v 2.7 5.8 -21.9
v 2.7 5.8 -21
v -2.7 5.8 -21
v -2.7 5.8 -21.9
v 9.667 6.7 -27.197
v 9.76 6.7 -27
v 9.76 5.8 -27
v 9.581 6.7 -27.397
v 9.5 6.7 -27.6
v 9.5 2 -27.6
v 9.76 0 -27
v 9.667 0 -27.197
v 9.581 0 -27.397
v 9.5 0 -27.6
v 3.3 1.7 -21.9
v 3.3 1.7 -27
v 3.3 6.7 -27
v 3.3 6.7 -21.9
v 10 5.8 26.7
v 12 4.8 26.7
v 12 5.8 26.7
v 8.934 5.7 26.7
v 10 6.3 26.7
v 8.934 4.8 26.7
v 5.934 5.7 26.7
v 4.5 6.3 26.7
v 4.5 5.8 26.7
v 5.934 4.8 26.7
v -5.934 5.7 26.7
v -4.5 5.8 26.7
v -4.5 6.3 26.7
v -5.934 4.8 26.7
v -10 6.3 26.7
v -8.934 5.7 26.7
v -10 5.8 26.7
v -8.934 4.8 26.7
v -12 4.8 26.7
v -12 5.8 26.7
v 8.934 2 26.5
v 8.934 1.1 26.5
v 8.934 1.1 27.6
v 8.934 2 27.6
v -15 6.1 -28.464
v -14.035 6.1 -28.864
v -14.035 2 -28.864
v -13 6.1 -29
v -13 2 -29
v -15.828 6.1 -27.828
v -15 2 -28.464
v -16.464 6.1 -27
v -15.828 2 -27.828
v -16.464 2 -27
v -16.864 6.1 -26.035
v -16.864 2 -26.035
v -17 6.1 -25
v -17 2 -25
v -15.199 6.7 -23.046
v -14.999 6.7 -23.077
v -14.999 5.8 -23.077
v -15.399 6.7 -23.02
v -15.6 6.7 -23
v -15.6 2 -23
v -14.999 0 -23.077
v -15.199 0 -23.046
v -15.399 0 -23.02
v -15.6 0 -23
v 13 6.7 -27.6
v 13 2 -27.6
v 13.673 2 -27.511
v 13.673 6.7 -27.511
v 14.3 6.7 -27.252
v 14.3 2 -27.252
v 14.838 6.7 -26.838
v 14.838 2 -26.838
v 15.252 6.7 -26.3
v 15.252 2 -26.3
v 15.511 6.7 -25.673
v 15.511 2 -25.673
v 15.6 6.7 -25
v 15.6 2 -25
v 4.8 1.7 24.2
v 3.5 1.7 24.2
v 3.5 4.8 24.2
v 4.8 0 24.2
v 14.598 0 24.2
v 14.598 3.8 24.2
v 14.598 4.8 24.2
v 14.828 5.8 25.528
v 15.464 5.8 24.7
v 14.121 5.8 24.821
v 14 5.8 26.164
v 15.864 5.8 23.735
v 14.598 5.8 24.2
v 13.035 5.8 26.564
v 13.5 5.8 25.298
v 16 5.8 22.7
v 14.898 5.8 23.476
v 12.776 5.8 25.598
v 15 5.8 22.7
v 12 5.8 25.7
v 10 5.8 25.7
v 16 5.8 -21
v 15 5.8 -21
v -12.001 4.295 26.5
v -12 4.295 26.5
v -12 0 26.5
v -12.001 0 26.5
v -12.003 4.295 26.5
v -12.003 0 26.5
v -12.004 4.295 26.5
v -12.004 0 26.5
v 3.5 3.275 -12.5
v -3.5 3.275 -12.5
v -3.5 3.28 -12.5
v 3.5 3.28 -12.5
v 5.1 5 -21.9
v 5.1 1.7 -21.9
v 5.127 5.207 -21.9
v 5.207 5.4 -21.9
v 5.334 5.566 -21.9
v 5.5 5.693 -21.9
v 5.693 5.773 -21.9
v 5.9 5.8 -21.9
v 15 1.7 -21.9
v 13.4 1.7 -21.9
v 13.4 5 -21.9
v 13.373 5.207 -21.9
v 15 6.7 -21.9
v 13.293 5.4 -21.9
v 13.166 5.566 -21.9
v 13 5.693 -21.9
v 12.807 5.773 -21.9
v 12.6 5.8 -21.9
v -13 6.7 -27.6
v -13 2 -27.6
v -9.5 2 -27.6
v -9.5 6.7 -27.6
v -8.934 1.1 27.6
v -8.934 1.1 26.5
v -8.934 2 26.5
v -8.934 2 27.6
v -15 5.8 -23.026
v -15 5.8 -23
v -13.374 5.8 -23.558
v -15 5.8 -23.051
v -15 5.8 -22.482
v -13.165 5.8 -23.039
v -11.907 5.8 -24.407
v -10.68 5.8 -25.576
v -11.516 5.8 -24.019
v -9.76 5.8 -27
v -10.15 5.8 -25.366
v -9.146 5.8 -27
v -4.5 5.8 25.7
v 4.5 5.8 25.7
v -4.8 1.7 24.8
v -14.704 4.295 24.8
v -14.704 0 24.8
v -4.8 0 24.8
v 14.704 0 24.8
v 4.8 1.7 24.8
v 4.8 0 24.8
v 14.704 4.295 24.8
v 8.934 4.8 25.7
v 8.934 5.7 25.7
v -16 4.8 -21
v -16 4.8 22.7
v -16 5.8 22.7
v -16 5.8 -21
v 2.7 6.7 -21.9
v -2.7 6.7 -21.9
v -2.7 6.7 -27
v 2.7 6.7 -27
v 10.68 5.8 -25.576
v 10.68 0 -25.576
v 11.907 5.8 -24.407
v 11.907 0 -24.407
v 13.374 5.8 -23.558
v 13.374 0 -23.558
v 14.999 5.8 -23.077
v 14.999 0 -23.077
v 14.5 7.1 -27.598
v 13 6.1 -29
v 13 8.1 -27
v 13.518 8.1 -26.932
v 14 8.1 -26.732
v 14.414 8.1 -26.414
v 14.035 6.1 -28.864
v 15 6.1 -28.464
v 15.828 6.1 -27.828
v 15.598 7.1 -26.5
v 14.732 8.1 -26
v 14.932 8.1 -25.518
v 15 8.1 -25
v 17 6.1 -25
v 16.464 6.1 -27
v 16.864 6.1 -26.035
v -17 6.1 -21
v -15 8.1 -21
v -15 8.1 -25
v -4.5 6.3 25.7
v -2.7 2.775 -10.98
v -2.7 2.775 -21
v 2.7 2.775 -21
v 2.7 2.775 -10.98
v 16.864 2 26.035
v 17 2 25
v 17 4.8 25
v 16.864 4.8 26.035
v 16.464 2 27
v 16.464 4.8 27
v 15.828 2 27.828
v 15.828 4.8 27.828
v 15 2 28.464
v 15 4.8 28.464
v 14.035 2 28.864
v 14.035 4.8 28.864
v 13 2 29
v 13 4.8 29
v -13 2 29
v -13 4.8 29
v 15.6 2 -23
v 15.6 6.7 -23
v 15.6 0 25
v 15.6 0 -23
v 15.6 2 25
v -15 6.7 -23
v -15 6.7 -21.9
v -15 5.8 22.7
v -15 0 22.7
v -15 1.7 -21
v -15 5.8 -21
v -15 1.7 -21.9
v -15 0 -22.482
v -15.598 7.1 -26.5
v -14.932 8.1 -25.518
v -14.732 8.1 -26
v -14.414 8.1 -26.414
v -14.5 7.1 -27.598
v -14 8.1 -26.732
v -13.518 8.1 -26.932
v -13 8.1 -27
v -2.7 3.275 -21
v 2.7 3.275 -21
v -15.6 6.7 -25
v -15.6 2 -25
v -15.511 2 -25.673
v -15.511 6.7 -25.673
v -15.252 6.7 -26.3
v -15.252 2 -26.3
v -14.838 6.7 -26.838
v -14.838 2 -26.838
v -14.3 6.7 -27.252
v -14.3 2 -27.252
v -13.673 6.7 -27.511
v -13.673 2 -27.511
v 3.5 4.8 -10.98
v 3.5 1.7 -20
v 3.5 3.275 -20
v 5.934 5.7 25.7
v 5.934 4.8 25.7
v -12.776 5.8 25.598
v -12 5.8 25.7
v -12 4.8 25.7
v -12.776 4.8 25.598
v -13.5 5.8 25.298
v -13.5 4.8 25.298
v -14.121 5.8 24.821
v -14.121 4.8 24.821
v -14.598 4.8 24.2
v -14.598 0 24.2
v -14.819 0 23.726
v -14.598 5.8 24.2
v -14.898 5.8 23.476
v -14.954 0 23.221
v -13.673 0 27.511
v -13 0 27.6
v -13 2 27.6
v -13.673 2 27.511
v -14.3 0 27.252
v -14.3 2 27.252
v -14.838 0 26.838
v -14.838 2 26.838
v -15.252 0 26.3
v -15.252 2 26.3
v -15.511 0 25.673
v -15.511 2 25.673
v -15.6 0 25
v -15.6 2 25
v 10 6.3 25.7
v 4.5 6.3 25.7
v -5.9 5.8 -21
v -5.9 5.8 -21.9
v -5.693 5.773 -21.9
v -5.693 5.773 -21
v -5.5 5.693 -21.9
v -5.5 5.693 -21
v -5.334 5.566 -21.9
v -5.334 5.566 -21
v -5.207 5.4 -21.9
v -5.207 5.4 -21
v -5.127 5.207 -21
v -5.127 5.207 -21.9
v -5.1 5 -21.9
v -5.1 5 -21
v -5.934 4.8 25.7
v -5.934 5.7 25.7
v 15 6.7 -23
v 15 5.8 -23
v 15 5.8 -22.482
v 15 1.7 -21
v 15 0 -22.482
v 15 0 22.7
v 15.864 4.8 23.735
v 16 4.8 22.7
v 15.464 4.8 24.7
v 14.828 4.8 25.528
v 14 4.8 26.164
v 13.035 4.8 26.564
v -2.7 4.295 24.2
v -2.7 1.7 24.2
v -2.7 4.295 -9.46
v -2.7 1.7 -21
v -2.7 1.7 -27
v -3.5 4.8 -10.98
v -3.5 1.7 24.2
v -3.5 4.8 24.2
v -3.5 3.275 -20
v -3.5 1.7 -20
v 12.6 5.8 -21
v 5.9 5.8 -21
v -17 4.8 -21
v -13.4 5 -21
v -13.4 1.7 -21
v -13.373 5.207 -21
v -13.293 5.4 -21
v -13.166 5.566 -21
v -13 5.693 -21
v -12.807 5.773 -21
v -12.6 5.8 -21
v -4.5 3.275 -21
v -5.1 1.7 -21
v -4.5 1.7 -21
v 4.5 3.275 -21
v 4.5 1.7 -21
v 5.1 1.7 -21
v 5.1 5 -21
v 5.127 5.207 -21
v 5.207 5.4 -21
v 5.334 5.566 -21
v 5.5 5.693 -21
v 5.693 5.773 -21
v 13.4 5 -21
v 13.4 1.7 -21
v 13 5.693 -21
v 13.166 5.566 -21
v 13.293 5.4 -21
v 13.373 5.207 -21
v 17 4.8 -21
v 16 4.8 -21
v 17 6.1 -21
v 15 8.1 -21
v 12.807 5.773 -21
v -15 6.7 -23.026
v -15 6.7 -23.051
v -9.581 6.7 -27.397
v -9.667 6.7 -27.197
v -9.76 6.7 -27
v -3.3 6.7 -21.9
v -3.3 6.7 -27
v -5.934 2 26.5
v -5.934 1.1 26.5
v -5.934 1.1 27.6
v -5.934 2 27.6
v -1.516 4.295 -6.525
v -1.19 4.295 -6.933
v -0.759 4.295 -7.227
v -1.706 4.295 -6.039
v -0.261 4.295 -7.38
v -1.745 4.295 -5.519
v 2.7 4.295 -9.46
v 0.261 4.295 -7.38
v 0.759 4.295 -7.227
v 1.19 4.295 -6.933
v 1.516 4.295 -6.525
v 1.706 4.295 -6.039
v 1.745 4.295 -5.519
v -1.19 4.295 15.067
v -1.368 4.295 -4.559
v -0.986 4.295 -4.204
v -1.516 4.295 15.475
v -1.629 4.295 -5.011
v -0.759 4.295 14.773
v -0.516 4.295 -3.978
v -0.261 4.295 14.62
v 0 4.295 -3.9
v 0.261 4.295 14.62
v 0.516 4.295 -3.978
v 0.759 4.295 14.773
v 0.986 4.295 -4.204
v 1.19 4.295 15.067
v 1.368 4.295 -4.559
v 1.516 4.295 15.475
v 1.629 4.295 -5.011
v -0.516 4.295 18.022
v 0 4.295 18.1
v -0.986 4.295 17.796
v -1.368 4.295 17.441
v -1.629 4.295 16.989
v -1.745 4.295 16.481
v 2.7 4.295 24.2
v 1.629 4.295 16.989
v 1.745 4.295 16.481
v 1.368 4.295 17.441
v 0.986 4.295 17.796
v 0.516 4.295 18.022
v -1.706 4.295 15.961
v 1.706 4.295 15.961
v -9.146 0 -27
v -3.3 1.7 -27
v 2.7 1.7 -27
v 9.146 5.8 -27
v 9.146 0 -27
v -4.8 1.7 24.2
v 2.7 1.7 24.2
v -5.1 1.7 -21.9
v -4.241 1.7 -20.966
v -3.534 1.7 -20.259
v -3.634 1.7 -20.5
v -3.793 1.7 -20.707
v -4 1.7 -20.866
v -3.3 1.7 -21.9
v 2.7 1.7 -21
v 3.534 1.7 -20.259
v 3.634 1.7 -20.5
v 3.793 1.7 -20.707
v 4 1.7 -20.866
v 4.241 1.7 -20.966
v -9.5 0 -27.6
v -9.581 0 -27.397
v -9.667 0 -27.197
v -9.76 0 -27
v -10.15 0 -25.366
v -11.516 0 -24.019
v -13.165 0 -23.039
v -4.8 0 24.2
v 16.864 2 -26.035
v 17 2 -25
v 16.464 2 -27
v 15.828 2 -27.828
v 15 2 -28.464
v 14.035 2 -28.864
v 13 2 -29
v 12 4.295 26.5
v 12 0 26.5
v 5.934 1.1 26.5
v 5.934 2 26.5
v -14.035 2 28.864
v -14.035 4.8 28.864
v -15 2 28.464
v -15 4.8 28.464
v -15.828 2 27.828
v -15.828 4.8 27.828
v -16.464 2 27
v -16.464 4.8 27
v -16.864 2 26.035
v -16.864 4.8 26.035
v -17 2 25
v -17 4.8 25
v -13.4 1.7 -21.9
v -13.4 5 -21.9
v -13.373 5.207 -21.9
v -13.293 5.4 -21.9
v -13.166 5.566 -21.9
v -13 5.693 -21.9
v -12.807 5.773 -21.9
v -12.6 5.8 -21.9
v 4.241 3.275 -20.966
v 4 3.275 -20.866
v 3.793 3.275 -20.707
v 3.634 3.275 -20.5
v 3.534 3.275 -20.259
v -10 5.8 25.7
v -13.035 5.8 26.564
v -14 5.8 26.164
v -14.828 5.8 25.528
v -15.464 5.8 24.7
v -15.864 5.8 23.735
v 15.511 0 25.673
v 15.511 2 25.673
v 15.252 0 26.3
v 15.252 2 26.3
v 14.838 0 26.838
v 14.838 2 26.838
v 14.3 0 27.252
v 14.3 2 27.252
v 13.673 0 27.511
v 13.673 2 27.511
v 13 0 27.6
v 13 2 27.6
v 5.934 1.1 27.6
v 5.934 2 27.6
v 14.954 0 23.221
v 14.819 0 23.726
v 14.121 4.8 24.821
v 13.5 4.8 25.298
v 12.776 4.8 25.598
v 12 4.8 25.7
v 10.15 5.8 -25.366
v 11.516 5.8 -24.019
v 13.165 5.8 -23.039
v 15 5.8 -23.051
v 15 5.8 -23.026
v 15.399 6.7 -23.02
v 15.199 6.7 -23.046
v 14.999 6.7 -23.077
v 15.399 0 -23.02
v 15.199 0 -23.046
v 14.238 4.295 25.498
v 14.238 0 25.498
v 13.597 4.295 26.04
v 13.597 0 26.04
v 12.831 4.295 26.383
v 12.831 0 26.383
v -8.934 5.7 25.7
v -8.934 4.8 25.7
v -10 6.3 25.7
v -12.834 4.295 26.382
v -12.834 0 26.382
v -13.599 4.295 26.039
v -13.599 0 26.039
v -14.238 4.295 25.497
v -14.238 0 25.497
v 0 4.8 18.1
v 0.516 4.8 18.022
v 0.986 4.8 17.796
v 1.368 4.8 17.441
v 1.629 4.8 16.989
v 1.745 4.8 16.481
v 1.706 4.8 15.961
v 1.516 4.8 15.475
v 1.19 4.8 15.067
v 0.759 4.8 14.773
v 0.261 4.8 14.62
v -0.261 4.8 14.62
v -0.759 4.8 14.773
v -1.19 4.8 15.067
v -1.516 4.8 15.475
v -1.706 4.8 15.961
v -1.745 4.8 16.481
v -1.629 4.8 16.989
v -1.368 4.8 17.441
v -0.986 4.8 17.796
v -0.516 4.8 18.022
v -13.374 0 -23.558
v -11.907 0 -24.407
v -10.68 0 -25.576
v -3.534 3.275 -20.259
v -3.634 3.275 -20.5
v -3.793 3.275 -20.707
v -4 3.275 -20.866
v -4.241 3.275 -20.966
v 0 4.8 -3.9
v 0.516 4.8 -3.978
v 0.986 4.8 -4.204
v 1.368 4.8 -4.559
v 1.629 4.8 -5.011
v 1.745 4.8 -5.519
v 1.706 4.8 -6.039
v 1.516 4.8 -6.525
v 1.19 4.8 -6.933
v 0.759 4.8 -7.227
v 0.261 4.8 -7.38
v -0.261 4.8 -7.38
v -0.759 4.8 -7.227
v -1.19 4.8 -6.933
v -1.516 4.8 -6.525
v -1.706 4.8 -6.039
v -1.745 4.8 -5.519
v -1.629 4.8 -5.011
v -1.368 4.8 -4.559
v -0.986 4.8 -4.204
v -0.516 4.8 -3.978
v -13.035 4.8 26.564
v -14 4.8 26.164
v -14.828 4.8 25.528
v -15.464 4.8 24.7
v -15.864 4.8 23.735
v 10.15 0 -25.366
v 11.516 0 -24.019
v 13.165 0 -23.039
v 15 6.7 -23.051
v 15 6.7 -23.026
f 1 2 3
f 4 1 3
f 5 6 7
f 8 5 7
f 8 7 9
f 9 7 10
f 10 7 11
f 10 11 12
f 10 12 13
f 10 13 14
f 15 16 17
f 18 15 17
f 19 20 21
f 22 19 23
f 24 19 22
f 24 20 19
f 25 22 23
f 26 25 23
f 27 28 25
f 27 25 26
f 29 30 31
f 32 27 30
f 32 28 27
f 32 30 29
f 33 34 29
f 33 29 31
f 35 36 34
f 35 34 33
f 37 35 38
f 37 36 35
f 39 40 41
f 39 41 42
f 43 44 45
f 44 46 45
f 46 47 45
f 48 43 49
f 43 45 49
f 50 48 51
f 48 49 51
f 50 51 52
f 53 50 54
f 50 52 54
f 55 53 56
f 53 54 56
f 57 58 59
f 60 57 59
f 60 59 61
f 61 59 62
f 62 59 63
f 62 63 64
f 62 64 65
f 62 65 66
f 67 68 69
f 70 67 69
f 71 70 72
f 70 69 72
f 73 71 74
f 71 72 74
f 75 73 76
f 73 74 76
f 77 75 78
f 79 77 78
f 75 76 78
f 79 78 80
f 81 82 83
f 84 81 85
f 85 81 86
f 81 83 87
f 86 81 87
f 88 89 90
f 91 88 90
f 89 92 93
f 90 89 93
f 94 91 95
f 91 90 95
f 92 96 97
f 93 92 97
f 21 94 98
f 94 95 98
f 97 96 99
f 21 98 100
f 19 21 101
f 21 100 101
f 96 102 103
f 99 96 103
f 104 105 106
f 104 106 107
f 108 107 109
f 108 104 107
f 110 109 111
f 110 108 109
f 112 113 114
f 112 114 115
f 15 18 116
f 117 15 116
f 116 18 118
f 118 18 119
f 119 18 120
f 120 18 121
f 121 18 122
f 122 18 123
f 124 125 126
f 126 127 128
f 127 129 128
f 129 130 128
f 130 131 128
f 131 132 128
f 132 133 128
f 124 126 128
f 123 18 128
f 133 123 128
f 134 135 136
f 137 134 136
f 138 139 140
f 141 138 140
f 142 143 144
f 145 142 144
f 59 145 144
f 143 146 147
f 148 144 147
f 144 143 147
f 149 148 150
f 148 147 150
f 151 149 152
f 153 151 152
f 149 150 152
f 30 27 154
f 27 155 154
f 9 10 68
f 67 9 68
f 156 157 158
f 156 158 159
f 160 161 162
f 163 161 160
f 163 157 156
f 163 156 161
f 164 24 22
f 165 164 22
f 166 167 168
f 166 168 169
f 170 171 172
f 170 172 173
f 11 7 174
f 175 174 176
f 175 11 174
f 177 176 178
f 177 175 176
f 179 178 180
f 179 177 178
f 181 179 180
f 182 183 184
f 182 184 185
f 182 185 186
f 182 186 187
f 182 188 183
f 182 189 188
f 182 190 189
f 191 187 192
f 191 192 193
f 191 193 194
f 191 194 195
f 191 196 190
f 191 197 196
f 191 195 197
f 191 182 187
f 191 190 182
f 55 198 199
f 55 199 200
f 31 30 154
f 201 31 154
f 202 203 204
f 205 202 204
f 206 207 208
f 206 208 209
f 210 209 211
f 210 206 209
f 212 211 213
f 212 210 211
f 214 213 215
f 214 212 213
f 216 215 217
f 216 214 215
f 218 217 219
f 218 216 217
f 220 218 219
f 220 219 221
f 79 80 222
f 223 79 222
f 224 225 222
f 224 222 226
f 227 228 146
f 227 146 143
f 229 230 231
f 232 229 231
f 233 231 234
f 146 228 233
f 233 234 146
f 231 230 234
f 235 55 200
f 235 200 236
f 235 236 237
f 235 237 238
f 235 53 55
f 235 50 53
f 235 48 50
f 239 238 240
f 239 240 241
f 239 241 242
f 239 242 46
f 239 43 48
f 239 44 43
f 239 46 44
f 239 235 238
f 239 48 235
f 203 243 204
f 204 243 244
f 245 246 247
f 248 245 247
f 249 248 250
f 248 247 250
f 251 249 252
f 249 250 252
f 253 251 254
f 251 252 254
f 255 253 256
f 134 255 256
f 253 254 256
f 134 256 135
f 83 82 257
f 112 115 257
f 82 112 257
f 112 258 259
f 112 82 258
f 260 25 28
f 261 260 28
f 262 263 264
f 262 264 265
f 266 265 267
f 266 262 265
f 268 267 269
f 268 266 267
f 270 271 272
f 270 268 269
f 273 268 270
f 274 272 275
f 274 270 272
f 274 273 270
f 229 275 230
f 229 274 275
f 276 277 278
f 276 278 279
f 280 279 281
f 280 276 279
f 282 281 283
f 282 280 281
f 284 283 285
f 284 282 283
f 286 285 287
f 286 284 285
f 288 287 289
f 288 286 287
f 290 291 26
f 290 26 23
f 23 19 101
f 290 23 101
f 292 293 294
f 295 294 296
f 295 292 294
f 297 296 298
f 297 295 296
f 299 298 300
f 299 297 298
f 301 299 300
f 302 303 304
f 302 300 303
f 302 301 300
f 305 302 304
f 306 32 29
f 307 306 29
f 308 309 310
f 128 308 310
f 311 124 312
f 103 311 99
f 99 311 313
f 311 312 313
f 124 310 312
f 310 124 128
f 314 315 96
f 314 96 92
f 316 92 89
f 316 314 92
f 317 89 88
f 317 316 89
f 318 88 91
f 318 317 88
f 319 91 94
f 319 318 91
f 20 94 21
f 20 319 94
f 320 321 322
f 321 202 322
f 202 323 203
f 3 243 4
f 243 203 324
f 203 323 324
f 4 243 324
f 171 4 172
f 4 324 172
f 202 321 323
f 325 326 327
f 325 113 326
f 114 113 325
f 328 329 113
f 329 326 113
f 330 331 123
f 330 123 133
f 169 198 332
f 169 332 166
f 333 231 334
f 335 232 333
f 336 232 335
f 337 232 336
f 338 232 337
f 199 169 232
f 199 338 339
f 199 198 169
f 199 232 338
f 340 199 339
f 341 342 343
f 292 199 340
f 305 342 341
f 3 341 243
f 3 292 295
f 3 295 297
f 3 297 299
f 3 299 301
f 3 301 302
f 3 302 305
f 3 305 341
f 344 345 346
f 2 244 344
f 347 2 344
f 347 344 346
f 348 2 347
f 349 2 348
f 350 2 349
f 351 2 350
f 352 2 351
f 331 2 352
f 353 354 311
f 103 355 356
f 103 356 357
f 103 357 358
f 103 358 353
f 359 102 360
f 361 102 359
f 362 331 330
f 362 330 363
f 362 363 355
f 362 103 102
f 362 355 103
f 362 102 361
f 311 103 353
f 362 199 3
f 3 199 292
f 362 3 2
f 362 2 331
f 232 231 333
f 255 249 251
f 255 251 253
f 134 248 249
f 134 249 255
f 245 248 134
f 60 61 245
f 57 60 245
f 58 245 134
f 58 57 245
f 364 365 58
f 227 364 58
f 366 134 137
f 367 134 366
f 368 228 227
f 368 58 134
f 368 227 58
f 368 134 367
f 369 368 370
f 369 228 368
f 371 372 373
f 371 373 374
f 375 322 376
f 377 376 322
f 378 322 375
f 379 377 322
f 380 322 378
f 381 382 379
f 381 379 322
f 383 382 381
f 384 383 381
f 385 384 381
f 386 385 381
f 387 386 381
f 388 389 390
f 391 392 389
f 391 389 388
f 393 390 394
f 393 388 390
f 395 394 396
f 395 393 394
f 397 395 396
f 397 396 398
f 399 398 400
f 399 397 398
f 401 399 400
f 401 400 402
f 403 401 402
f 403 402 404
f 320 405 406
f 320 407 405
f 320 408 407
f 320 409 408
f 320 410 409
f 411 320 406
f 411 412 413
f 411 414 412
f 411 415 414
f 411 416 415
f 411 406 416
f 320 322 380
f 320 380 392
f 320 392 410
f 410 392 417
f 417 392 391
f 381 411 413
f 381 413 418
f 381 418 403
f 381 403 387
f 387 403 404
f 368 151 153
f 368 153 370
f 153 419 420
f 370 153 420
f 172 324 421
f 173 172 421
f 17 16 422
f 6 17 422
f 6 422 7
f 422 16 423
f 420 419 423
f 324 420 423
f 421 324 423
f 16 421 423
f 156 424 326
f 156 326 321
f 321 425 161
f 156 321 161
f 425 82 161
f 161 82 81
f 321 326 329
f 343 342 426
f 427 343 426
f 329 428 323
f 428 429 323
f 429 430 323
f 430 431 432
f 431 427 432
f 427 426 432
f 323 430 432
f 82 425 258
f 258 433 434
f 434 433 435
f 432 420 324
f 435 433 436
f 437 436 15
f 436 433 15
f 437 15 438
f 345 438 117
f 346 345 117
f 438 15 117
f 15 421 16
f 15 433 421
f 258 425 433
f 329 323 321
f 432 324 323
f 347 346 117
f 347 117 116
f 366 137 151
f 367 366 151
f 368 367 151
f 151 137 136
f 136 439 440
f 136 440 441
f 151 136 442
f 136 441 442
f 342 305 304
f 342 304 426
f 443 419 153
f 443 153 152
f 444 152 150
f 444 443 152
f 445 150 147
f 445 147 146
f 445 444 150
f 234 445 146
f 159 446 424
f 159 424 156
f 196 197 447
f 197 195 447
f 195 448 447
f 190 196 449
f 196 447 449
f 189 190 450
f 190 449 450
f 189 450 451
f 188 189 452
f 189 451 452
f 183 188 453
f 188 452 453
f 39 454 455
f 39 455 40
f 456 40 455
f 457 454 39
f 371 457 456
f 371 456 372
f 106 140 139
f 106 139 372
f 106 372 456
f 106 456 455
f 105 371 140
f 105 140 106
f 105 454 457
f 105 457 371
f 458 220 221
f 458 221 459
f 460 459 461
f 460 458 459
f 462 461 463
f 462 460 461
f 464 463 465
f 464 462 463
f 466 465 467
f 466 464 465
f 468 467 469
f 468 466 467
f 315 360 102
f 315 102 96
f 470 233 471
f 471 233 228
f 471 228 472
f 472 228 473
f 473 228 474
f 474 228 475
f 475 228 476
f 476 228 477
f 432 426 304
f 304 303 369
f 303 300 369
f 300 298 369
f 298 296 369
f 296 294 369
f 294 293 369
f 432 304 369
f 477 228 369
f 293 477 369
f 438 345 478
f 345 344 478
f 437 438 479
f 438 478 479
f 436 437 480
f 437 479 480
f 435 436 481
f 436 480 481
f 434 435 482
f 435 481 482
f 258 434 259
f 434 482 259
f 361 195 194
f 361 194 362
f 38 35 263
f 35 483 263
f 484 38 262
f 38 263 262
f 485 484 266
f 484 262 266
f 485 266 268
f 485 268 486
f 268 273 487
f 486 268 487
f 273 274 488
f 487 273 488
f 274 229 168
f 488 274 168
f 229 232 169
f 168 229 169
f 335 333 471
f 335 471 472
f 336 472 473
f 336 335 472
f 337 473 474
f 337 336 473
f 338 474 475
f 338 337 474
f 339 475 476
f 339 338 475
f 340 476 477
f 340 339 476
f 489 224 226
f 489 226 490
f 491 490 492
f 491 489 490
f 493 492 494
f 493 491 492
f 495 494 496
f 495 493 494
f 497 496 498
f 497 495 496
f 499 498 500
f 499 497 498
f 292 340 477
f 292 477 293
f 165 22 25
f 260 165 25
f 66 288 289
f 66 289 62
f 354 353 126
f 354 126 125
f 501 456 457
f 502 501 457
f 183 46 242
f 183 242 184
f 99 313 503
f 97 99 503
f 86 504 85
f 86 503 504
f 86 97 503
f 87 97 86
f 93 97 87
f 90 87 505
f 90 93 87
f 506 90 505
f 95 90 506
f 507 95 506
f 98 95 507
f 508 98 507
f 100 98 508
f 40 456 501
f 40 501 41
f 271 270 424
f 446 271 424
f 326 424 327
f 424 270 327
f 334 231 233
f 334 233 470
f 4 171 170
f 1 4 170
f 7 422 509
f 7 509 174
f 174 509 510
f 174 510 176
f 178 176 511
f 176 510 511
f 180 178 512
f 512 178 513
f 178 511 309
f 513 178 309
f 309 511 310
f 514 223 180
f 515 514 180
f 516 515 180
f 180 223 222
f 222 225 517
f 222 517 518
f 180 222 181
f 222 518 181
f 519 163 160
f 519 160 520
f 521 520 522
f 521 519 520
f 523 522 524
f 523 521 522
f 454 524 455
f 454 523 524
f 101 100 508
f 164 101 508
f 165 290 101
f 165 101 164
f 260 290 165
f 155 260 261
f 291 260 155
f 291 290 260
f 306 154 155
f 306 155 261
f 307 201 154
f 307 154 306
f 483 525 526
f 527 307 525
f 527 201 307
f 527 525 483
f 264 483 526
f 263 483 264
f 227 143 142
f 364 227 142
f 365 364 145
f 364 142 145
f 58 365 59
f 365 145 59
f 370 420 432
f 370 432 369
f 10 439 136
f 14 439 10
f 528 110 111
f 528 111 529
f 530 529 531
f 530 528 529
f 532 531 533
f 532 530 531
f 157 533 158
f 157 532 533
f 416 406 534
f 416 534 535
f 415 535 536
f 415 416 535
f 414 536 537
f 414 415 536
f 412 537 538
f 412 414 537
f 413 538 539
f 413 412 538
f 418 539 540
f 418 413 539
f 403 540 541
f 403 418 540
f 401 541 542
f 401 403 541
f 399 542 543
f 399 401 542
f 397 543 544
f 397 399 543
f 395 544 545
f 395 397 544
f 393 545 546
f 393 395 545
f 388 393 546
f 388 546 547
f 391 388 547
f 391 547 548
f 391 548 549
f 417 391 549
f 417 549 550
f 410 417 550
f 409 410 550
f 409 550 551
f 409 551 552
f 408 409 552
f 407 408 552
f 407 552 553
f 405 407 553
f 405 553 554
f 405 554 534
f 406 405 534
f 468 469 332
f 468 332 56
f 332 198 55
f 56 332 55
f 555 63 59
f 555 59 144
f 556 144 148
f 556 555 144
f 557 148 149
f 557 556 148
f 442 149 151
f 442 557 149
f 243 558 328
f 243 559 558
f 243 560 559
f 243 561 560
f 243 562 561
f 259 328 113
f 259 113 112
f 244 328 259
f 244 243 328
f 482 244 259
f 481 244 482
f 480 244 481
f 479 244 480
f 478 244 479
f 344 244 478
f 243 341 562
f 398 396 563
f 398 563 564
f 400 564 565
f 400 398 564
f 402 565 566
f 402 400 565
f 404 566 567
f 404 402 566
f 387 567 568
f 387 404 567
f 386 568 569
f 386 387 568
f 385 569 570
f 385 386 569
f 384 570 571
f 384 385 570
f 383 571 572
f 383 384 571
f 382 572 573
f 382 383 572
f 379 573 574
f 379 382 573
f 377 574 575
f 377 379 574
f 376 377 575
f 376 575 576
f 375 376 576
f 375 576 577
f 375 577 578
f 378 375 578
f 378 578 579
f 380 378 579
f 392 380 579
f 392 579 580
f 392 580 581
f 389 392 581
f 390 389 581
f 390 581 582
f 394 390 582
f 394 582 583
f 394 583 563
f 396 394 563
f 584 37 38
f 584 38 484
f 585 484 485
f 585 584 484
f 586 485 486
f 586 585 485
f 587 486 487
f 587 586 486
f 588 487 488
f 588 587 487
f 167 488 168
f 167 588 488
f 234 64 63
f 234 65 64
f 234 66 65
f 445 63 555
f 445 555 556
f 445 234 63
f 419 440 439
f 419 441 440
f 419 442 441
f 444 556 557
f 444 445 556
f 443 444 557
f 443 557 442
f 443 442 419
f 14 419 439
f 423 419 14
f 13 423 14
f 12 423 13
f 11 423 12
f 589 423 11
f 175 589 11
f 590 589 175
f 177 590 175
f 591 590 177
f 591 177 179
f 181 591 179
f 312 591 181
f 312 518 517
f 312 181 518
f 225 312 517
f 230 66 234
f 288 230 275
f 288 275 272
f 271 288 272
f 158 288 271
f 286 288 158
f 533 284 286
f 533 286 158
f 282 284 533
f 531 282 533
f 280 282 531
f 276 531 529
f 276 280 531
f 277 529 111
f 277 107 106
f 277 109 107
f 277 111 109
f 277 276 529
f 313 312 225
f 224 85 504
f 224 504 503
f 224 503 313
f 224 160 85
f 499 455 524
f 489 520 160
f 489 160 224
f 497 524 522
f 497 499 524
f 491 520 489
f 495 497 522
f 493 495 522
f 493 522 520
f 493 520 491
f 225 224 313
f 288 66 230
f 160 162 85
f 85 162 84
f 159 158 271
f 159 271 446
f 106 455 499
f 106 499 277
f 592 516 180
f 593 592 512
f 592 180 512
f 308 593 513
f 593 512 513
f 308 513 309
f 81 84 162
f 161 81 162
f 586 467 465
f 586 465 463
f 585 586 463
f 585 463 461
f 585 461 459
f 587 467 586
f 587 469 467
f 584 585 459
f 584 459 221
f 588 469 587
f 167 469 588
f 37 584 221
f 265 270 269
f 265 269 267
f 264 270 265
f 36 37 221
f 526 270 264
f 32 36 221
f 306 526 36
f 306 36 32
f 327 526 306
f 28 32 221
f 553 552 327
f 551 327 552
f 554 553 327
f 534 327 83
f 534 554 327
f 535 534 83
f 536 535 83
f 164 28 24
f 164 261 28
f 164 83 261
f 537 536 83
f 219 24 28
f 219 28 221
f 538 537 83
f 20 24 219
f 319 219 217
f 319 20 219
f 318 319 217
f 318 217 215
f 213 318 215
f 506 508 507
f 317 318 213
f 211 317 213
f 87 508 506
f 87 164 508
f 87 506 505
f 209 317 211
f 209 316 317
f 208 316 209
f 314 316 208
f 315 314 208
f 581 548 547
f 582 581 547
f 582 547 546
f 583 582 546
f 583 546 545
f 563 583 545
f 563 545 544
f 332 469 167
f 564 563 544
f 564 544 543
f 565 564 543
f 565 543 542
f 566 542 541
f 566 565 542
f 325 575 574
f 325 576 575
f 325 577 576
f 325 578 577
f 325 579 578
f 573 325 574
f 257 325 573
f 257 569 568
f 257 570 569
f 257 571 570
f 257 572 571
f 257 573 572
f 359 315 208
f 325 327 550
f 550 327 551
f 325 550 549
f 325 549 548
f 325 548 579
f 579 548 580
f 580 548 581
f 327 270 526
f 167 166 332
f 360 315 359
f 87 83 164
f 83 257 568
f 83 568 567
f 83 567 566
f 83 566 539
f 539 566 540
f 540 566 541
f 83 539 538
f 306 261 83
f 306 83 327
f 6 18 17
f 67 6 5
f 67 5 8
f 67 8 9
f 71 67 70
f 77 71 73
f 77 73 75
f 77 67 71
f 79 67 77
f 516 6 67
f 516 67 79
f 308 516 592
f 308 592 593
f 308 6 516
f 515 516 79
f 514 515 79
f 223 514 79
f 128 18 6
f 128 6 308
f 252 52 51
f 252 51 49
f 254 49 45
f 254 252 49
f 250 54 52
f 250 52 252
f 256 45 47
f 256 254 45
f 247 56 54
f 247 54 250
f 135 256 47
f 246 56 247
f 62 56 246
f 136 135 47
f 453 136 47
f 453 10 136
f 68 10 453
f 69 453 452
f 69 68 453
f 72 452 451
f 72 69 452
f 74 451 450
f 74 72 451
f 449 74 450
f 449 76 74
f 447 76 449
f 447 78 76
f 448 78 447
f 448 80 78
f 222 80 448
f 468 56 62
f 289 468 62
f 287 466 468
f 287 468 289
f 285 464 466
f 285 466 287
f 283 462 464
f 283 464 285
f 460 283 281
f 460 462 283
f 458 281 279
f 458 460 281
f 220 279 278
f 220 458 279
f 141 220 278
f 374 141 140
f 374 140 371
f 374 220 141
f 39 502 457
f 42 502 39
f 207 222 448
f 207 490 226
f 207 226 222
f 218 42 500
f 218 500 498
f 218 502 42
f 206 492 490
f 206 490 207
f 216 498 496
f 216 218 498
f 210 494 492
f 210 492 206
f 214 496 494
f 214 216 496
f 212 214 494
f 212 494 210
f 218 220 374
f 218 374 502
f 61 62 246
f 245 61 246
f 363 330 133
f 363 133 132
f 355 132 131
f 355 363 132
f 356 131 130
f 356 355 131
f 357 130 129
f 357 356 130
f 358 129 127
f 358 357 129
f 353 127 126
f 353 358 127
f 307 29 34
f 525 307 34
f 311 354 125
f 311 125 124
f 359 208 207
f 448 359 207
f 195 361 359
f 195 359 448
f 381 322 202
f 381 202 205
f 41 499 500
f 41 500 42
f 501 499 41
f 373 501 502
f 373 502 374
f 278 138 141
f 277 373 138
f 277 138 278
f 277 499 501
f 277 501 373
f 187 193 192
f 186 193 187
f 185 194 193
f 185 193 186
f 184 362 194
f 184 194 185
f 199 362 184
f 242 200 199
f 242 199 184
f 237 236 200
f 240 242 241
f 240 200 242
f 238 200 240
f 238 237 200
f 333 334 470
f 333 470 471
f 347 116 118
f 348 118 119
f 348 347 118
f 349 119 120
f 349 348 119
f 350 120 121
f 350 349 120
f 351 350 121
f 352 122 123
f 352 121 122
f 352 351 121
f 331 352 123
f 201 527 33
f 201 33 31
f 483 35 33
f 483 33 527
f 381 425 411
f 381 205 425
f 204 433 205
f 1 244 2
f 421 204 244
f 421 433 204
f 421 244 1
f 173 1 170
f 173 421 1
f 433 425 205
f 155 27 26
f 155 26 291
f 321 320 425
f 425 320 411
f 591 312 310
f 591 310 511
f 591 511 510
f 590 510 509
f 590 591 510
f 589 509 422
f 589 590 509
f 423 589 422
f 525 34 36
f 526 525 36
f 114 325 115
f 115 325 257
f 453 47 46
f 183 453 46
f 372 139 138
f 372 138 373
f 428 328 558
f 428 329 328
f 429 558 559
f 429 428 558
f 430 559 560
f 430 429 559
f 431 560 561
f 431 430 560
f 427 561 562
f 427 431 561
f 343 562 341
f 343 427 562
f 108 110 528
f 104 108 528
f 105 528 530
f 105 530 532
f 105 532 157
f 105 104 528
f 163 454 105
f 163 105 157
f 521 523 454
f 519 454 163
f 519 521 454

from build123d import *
from build123d.topology import SkipClean

# Parameters (mm, degrees)
BOSS_EXTRUDE2_DEPTH      = 5.8
BOSS_EXTRUDE5_DEPTH      = 17
BOSS_EXTRUDE5_DEPTH_BACK = 17
SKETCH20_W               = 8
SKETCH20_H               = 2.3
CUT_EXTRUDE3_DEPTH       = 35.112167917
BOSS_EXTRUDE6_DEPTH      = 5.8
CHAMFER1_SIZE            = 2
CUT_EXTRUDE4_START       = -1
CUT_EXTRUDE4_DEPTH       = 1
CUT_EXTRUDE5_DEPTH       = 35.112167917
BOSS_EXTRUDE8_DEPTH      = 5.8
SKETCH28_W               = 5.5
SKETCH28_H               = 1
BOSS_EXTRUDE9_DEPTH      = 0.5
CUT_EXTRUDE6_DEPTH       = 1
CUT_EXTRUDE7_DEPTH       = 2
CUT_EXTRUDE14_START      = -1.9
SKETCH45_W               = 3
SKETCH45_H               = 0.9
CUT_EXTRUDE14_DEPTH      = 1.9
CUT_EXTRUDE11_DEPTH      = 0.9
SKETCH40_W               = 30
SKETCH40_H               = 0.9
BOSS_EXTRUDE11_DEPTH     = 4.1
CUT_EXTRUDE12_REACH      = 55.429
CUT_EXTRUDE13_REACH      = 55.429
SKETCH47_W               = 0.6
SKETCH47_H               = 5
BOSS_EXTRUDE13_DEPTH     = 5.1
BOSS_EXTRUDE14_DEPTH     = 5.8
CUT_EXTRUDE23_DEPTH      = 6.7
BOSS_EXTRUDE15_DEPTH     = 1
SKETCH43_W               = 5.4
SKETCH43_H               = 0.5
SKETCH43_W_2             = 0.8
SKETCH43_H_2             = 1.075370029
BOSS_EXTRUDE17_DEPTH     = 45.2
SKETCH53_W               = 7
SKETCH53_H               = 36.7
BOSS_EXTRUDE18_DEPTH     = 1.52463
CHAMFER3_SIZE            = 1.52
CUT_EXTRUDE24_START      = -2.02463
SKETCH56_R               = 1.75
CUT_EXTRUDE24_DEPTH      = 2.02463
FILLET1_R                = 1
SKETCH57_W               = 5.4
SKETCH57_H               = 35.18
CUT_EXTRUDE25_DEPTH      = 1.52
CHAMFER4_SIZE            = 1.52
SKETCH59_W               = 0.8
SKETCH59_H               = 2.1
BOSS_EXTRUDE21_DEPTH     = 1.5
SKETCH61_W               = 4.290499921
SKETCH61_H               = 0.6
BOSS_EXTRUDE23_DEPTH     = 3.8
SKETCH64_W               = 4.8
SKETCH64_H               = 0.6
CUT_EXTRUDE26_DEPTH      = 1.7
CUT_EXTRUDE27_START      = -4.295370029
CUT_EXTRUDE27_DEPTH      = 4.295370029


with BuildPart() as part:
    # Sketch1 → Boss-Extrude2 (new body)
    with BuildSketch(Plane(origin=(0, 0, 0), x_dir=(1, 0, 0), z_dir=(0, 1, 0))):
        with BuildLine():
            Line((-13, 29), (13, 29))
            ThreePointArc((13, 29), (15.828427125, 27.828427125), (17, 25))
            Line((17, 25), (17, -25))
            ThreePointArc((17, -25), (15.828427125, -27.828427125), (13, -29))
            Line((13, -29), (-13, -29))
            ThreePointArc((-13, -29), (-15.828427125, -27.828427125), (-17, -25))
            Line((-17, -25), (-17, 25))
            ThreePointArc((-17, 25), (-15.828427125, 27.828427125), (-13, 29))
        make_face()
        with BuildLine():
            Line((-11, 27), (11, 27))
            ThreePointArc((11, 27), (13.828427125, 25.828427125), (15, 23))
            Line((15, 23), (15, -23))
            ThreePointArc((15, -23), (13.828427125, -25.828427125), (11, -27))
            Line((11, -27), (-11, -27))
            ThreePointArc((-11, -27), (-13.828427125, -25.828427125), (-15, -23))
            Line((-15, -23), (-15, 23))
            ThreePointArc((-15, 23), (-13.828427125, 25.828427125), (-11, 27))
        make_face(mode=Mode.SUBTRACT)
    extrude(amount=BOSS_EXTRUDE2_DEPTH)

    # Sketch20 → Boss-Extrude5 (add, two sides: drawn at the far end of the back side and taken through both)
    with BuildSketch(Plane(origin=(0, 0, 0), x_dir=(0, 0, -1), z_dir=(1, 0, 0)).offset(-BOSS_EXTRUDE5_DEPTH_BACK)):
        with Locations((25, 6.95)):
            Rectangle(SKETCH20_W, SKETCH20_H)
    extrude(amount=BOSS_EXTRUDE5_DEPTH + BOSS_EXTRUDE5_DEPTH_BACK)

    # Sketch22 → Cut-Extrude3 (cut, through all)
    with BuildSketch(Plane.XZ.offset(-5.8)):
        with BuildLine():
            Line((-17, -25), (-17, -29))
            Line((-17, -29), (-13, -29))
            ThreePointArc((-13, -29), (-15.828427125, -27.828427125), (-17, -25))
        make_face()
        with BuildLine():
            Line((13, -29), (17, -29))
            Line((17, -29), (17, -25))
            ThreePointArc((17, -25), (15.828427125, -27.828427125), (13, -29))
        make_face()
    extrude(amount=-CUT_EXTRUDE3_DEPTH, mode=Mode.SUBTRACT)

    # Sketch23 → Boss-Extrude6 (add, through all)
    with BuildSketch(Plane(origin=(0, 5.8, 0), x_dir=(1, 0, 0), z_dir=(0, 1, 0))):
        with BuildLine():
            Line((-17, -24.2), (17, -24.2))
            Line((17, -24.2), (17, -25))
            ThreePointArc((17, -25), (15.828427125, -27.828427125), (13, -29))
            Line((13, -29), (-13, -29))
            ThreePointArc((-13, -29), (-15.828427125, -27.828427125), (-17, -25))
            Line((-17, -25), (-17, -24.2))
        make_face()
    extrude(amount=-BOSS_EXTRUDE6_DEPTH)

    # Chamfer1
    chamfer1_edges = [part.edges().sort_by_distance(p)[0] for p in [
        (0, 8.1, -29),
        (-17, 8.1, -23),
        (17, 8.1, -23),
        (-15.828427125, 8.1, -27.828427125),
        (15.828427125, 8.1, -27.828427125),
    ]]
    chamfer(chamfer1_edges, length=CHAMFER1_SIZE)

    # Sketch26 → Cut-Extrude4 (cut)
    with BuildSketch(Plane(origin=(0, 5.8, 0), x_dir=(1, 0, 0), z_dir=(0, 1, 0)).offset(CUT_EXTRUDE4_START)):
        with BuildLine():
            Line((-16, 21), (-17, 21))
            Line((-17, 21), (-17, -25))
            ThreePointArc((-17, -25), (-15.828427125, -27.828427125), (-13, -29))
            Line((-13, -29), (13, -29))
            ThreePointArc((13, -29), (15.828427125, -27.828427125), (17, -25))
            Line((17, -25), (17, 21))
            Line((17, 21), (16, 21))
            Line((16, 21), (16, -22.7))
            ThreePointArc((16, -22.7), (14.828427125, -25.528427125), (12, -26.7))
            Line((12, -26.7), (-12, -26.7))
            ThreePointArc((-12, -26.7), (-14.828427125, -25.528427125), (-16, -22.7))
            Line((-16, -22.7), (-16, 21))
        make_face()
    extrude(amount=CUT_EXTRUDE4_DEPTH, mode=Mode.SUBTRACT)

    # Sketch27 → Cut-Extrude5 (cut, through all)
    with BuildSketch(Plane(origin=(0, 5.8, 0), x_dir=(1, 0, 0), z_dir=(0, 1, 0))):
        with BuildLine():
            Line((-15, -22.7), (15, -22.7))
            ThreePointArc((15, -22.7), (14.121320344, -24.821320344), (12, -25.7))
            Line((12, -25.7), (-12, -25.7))
            ThreePointArc((-12, -25.7), (-14.121320344, -24.821320344), (-15, -22.7))
        make_face()
    extrude(amount=-CUT_EXTRUDE5_DEPTH, mode=Mode.SUBTRACT)

    # Sketch25 → Boss-Extrude8 (add, through all)
    with BuildSketch(Plane(origin=(0, 5.8, 0), x_dir=(1, 0, 0), z_dir=(0, 1, 0))):
        with BuildLine():
            Line((15, 21), (15, -22.7))
            ThreePointArc((15, -22.7), (14.121320344, -24.821320344), (12, -25.7))
            Line((12, -25.7), (-12, -25.7))
            ThreePointArc((-12, -25.7), (-14.121320344, -24.821320344), (-15, -22.7))
            Line((-15, -22.7), (-15, 21))
            Line((-15, 21), (-16, 21))
            Line((-16, 21), (-16, -22.7))
            ThreePointArc((-16, -22.7), (-14.828427125, -25.528427125), (-12, -26.7))
            Line((-12, -26.7), (12, -26.7))
            ThreePointArc((12, -26.7), (14.828427125, -25.528427125), (16, -22.7))
            Line((16, -22.7), (16, 21))
            Line((16, 21), (15, 21))
        make_face()
    extrude(amount=-BOSS_EXTRUDE8_DEPTH)

    # Sketch28 → Boss-Extrude9 (add)
    with BuildSketch(Plane(origin=(0, 5.8, 0), x_dir=(1, 0, 0), z_dir=(0, 1, 0))):
        with Locations((-7.25, -26.2)):
            Rectangle(SKETCH28_W, SKETCH28_H)
        with Locations((7.25, -26.2)):
            Rectangle(SKETCH28_W, SKETCH28_H)
    extrude(amount=BOSS_EXTRUDE9_DEPTH)

    # Sketch29 → Cut-Extrude6 (cut)
    with BuildSketch(Plane.XY.offset(26.7)):
        Polygon((-7.434487223, 4.8), (-5.934487223, 4.8), (-5.934487223, 5.7), (-8.934487223, 5.7), (-8.934487223, 4.8), align=None)
        Polygon((8.934487223, 5.7), (5.934487223, 5.7), (5.934487223, 4.8), (7.434487223, 4.8), (8.934487223, 4.8), align=None)
    extrude(amount=-CUT_EXTRUDE6_DEPTH, mode=Mode.SUBTRACT)

    # Sketch33 → Cut-Extrude7 (cut)
    with BuildSketch(Plane.XZ):
        with BuildLine():
            Line((-13, -29), (13, -29))
            ThreePointArc((13, -29), (15.828427125, -27.828427125), (17, -25))
            Line((17, -25), (17, 25))
            ThreePointArc((17, 25), (15.828427125, 27.828427125), (13, 29))
            Line((13, 29), (-13, 29))
            ThreePointArc((-13, 29), (-15.828427125, 27.828427125), (-17, 25))
            Line((-17, 25), (-17, -25))
            ThreePointArc((-17, -25), (-15.828427125, -27.828427125), (-13, -29))
        make_face()
        with BuildLine():
            Line((-15.6, 25), (-15.6, -25))
            ThreePointArc((-15.6, -25), (-14.838477631, -26.838477631), (-13, -27.6))
            Line((-13, -27.6), (13, -27.6))
            ThreePointArc((13, -27.6), (14.838477631, -26.838477631), (15.6, -25))
            Line((15.6, -25), (15.6, 25))
            ThreePointArc((15.6, 25), (14.838477631, 26.838477631), (13, 27.6))
            Line((13, 27.6), (-13, 27.6))
            ThreePointArc((-13, 27.6), (-14.838477631, 26.838477631), (-15.6, 25))
        make_face(mode=Mode.SUBTRACT)
    extrude(amount=-CUT_EXTRUDE7_DEPTH, mode=Mode.SUBTRACT)

    # Sketch45 → Cut-Extrude14 (cut)
    with BuildSketch(Plane.XY.offset(27.6).offset(CUT_EXTRUDE14_START)):
        with Locations((7.434487223, 1.55)):
            Rectangle(SKETCH45_W, SKETCH45_H)
        with Locations((-7.434487223, 1.55)):
            Rectangle(SKETCH45_W, SKETCH45_H)
    extrude(amount=CUT_EXTRUDE14_DEPTH, mode=Mode.SUBTRACT)

    # Sketch39 → Cut-Extrude11 (cut)
    with BuildSketch(Plane.XZ.offset(-5.8)):
        with BuildLine():
            Line((15, -21.9), (-15, -21.9))
            Line((-15, -21.9), (-15, -23))
            ThreePointArc((-15, -23), (-13.828427125, -25.828427125), (-11, -27))
            Line((-11, -27), (11, -27))
            ThreePointArc((11, -27), (13.828427125, -25.828427125), (15, -23))
            Line((15, -23), (15, -21.9))
        make_face()
    extrude(amount=-CUT_EXTRUDE11_DEPTH, mode=Mode.SUBTRACT)

    # Sketch40 → Boss-Extrude11 (add)
    with BuildSketch(Plane.XZ.offset(-5.8)):
        with Locations((0, -21.45)):
            Rectangle(SKETCH40_W, SKETCH40_H)
    extrude(amount=BOSS_EXTRUDE11_DEPTH)

    # Sketch38 → Cut-Extrude12 (cut, up to next)
    with BuildSketch(Plane.XY.offset(-21), mode=Mode.PRIVATE) as cut_extrude12_sk1:
        Polygon((2.7, 5.8), (0, 5.8), (-2.7, 5.8), (-2.7, 1.285789379), (2.7, 1.285789379), align=None)
    cut_extrude12_tool1 = extrude(cut_extrude12_sk1.sketch, amount=-CUT_EXTRUDE12_REACH, mode=Mode.PRIVATE) & part.part
    add(cut_extrude12_tool1.solids().sort_by_distance((0, 3.542895, -21))[0], mode=Mode.SUBTRACT)

    # Sketch41 → Cut-Extrude13 (cut, up to next)
    with BuildSketch(Plane.XY.offset(-21), mode=Mode.PRIVATE) as cut_extrude13_sk1:
        with BuildLine():
            Line((5.9, 5.8), (12.6, 5.8))
            ThreePointArc((12.6, 5.8), (13.165685425, 5.565685425), (13.4, 5))
            Line((13.4, 5), (13.4, 1.7))
            Line((13.4, 1.7), (5.1, 1.7))
            Line((5.1, 1.7), (5.1, 5))
            ThreePointArc((5.1, 5), (5.334314575, 5.565685425), (5.9, 5.8))
        make_face()
    cut_extrude13_tool1 = extrude(cut_extrude13_sk1.sketch, amount=-CUT_EXTRUDE13_REACH, mode=Mode.PRIVATE) & part.part
    # Sketch41 → Cut-Extrude13 (cut, up to next)
    with BuildSketch(Plane.XY.offset(-21), mode=Mode.PRIVATE) as cut_extrude13_sk2:
        with BuildLine():
            Line((-5.1, 5), (-5.1, 1.7))
            Line((-5.1, 1.7), (-13.4, 1.7))
            Line((-13.4, 1.7), (-13.4, 5))
            ThreePointArc((-13.4, 5), (-13.165685425, 5.565685425), (-12.6, 5.8))
            Line((-12.6, 5.8), (-5.9, 5.8))
            ThreePointArc((-5.9, 5.8), (-5.334314575, 5.565685425), (-5.1, 5))
        make_face()
    cut_extrude13_tool2 = extrude(cut_extrude13_sk2.sketch, amount=-CUT_EXTRUDE13_REACH, mode=Mode.PRIVATE) & part.part
    add(cut_extrude13_tool1.solids().sort_by_distance((9.25, 3.734772, -21))[0], mode=Mode.SUBTRACT)
    add(cut_extrude13_tool2.solids().sort_by_distance((-9.25, 3.734772, -21))[0], mode=Mode.SUBTRACT)

    # Sketch47 → Boss-Extrude13 (add)
    with BuildSketch(Plane(origin=(0, 0, -21.9), x_dir=(-1, 0, 0), z_dir=(0, 0, -1))):
        with Locations((3, 4.2)):
            Rectangle(SKETCH47_W, SKETCH47_H)
        with Locations((-3, 4.2)):
            Rectangle(SKETCH47_W, SKETCH47_H)
    extrude(amount=BOSS_EXTRUDE13_DEPTH)

    # Sketch50 → Boss-Extrude14 (add)
    with BuildSketch(Plane.XZ):
        with BuildLine():
            ThreePointArc((15.6, -22.4), (11.498859301, -24.0321841), (8.9, -27.6))
            Line((8.9, -27.6), (9.5, -27.6))
            ThreePointArc((9.5, -27.6), (11.887551109, -24.421535167), (15.6, -23))
            Line((15.6, -23), (15.6, -22.4))
        make_face()
        with BuildLine():
            Line((-15.6, -22.4), (-15.6, -23))
            ThreePointArc((-15.6, -23), (-11.887551109, -24.421535167), (-9.5, -27.6))
            Line((-9.5, -27.6), (-8.9, -27.6))
            ThreePointArc((-8.9, -27.6), (-11.498859301, -24.0321841), (-15.6, -22.4))
        make_face()
    extrude(amount=-BOSS_EXTRUDE14_DEPTH)

    # Sketch50<6> → Cut-Extrude23 (cut)
    with SkipClean():  # the faces are left unmerged after this step: merging them gives an invalid solid
        with BuildSketch(Plane.XZ):
            with BuildLine():
                ThreePointArc((-14.999259325, -23.076973055), (-15.298817872, -23.032150864), (-15.6, -23))
                Line((-15.6, -23), (-15.6, -25))
                ThreePointArc((-15.6, -25), (-14.838477631, -26.838477631), (-13, -27.6))
                Line((-13, -27.6), (-9.5, -27.6))
                ThreePointArc((-9.5, -27.6), (-9.623329595, -27.297034905), (-9.760327053, -27))
                Line((-9.760327053, -27), (-11, -27))
                ThreePointArc((-11, -27), (-13.801080843, -25.855511532), (-14.999259325, -23.076973055))
            make_face()
            with BuildLine():
                Line((9.5, -27.6), (13, -27.6))
                ThreePointArc((13, -27.6), (14.838477631, -26.838477631), (15.6, -25))
                Line((15.6, -25), (15.6, -23))
                ThreePointArc((15.6, -23), (15.298817872, -23.032150864), (14.999259325, -23.076973055))
                ThreePointArc((14.999259325, -23.076973055), (13.801080843, -25.855511532), (11, -27))
                Line((11, -27), (9.760327053, -27))
                ThreePointArc((9.760327053, -27), (9.623329595, -27.297034905), (9.5, -27.6))
            make_face()
        extrude(amount=-CUT_EXTRUDE23_DEPTH, mode=Mode.SUBTRACT)

    # Sketch51 → Boss-Extrude15 (add)
    with SkipClean():  # the faces are left unmerged after this step: merging them gives an invalid solid
        with BuildSketch(Plane(origin=(0, 4.8, 0), x_dir=(1, 0, 0), z_dir=(0, 1, 0))):
            with BuildLine():
                Line((0, -24.2), (-14.598076211, -24.2))
                ThreePointArc((-14.598076211, -24.2), (-13.5, -25.298076211), (-12, -25.7))
                Line((-12, -25.7), (-10, -25.7))
                Line((-10, -25.7), (-4.5, -25.7))
                Line((-4.5, -25.7), (4.5, -25.7))
                Line((4.5, -25.7), (10, -25.7))
                Line((10, -25.7), (12, -25.7))
                ThreePointArc((12, -25.7), (13.5, -25.298076211), (14.598076211, -24.2))
                Line((14.598076211, -24.2), (0, -24.2))
            make_face()
        extrude(amount=-BOSS_EXTRUDE15_DEPTH)

    # Sketch43 → Boss-Extrude17 (add)
    with SkipClean():  # the faces are left unmerged after this step: merging them gives an invalid solid
        with BuildSketch(Plane.XY.offset(-21)):
            with Locations((0, 3.025370029)):
                Rectangle(SKETCH43_W, SKETCH43_H)
            with Locations((-3.1, 3.025370029)):
                Rectangle(SKETCH43_W_2, SKETCH43_H)
            with Locations((-3.1, 2.237685015)):
                Rectangle(SKETCH43_W_2, SKETCH43_H_2)
            with Locations((3.1, 2.237685015)):
                Rectangle(SKETCH43_W_2, SKETCH43_H_2)
            with Locations((3.1, 3.025370029)):
                Rectangle(SKETCH43_W_2, SKETCH43_H)
        extrude(amount=BOSS_EXTRUDE17_DEPTH)

    # Sketch53 → Boss-Extrude18 (add)
    with SkipClean():  # the faces are left unmerged after this step: merging them gives an invalid solid
        with BuildSketch(Plane(origin=(0, 3.275370029, 0), x_dir=(1, 0, 0), z_dir=(0, 1, 0))):
            with Locations((0, -5.85)):
                Rectangle(SKETCH53_W, SKETCH53_H)
        extrude(amount=BOSS_EXTRUDE18_DEPTH)

    # Chamfer3
    chamfer3_edges = [part.edges().sort_by_distance(p)[0] for p in [
        (0, 4.800000029, -12.5),
    ]]
    chamfer(chamfer3_edges, length=CHAMFER3_SIZE)

    # Sketch56 → Cut-Extrude24 (cut)
    with SkipClean():  # the faces are left unmerged after this step: merging them gives an invalid solid
        with BuildSketch(Plane(origin=(0, 4.8, 0), x_dir=(1, 0, 0), z_dir=(0, 1, 0)).offset(CUT_EXTRUDE24_START)):
            with Locations(Location((0, -16.35, 0), (0, 0, 270))):
                Circle(SKETCH56_R)
            with Locations(Location((0, 5.65, 0), (0, 0, 270))):
                Circle(SKETCH56_R)
        extrude(amount=CUT_EXTRUDE24_DEPTH, mode=Mode.SUBTRACT)

    # Fillet1
    fillet1_edges = [part.edges().sort_by_distance(p)[0] for p in [
        (-3.5, 2.487685015, -21),
        (3.5, 2.487685015, -21),
    ]]
    fillet(fillet1_edges, radius=FILLET1_R)

    # Sketch57 → Cut-Extrude25 (cut)
    with SkipClean():  # the faces are left unmerged after this step: merging them gives an invalid solid
        with BuildSketch(Plane.XZ.offset(-2.775370029)):
            with Locations((0, 6.61)):
                Rectangle(SKETCH57_W, SKETCH57_H)
        extrude(amount=-CUT_EXTRUDE25_DEPTH, mode=Mode.SUBTRACT)

    # Chamfer4
    chamfer4_edges = [part.edges().sort_by_distance(p)[0] for p in [
        (0, 4.295370029, -10.98),
    ]]
    chamfer(chamfer4_edges, length=CHAMFER4_SIZE - 0.0001)  # a hair under: the kernel refuses the full size

    # Sketch59 → Boss-Extrude21 (add)
    with BuildSketch(Plane.XY.offset(24.2)):
        with Locations((3.1, 2.75)):
            Rectangle(SKETCH59_W, SKETCH59_H)
        with Locations((-3.1, 2.75)):
            Rectangle(SKETCH59_W, SKETCH59_H)
    extrude(amount=BOSS_EXTRUDE21_DEPTH)

    # Sketch61 → Boss-Extrude23 (add)
    with BuildSketch(Plane.XZ.offset(-3.8)):
        with BuildLine():
            Line((-7.790499921, 24.2), (-7.790499921, 24.8))
            Line((-7.790499921, 24.8), (-14.11637904, 24.8))
            Line((-14.11637904, 24.8), (-14.142428529, 24.8))
            ThreePointArc((-14.142428529, 24.8), (-14.389162258, 24.514360411), (-14.598076211, 24.2))
            Line((-14.598076211, 24.2), (-7.790499921, 24.2))
        make_face()
        with Locations((-5.645249961, 24.5)):
            Rectangle(SKETCH61_W, SKETCH61_H)
        Polygon((14.115997682, 24.8), (-3.5, 24.8), (-3.5, 24.2), (15.044287411, 24.2), (15.044287411, 24.8), align=None)
    extrude(amount=BOSS_EXTRUDE23_DEPTH)

    # Sketch64 → Cut-Extrude26 (cut)
    with BuildSketch(Plane.XZ):
        with Locations((-2.4, 24.5)):
            Rectangle(SKETCH64_W, SKETCH64_H)
        with Locations((2.4, 24.5)):
            Rectangle(SKETCH64_W, SKETCH64_H)
    extrude(amount=-CUT_EXTRUDE26_DEPTH, mode=Mode.SUBTRACT)

    # Sketch65 → Cut-Extrude27 (cut)
    with BuildSketch(Plane.XZ.offset(CUT_EXTRUDE27_START)):
        with BuildLine():
            Line((11.133212655, 26.5), (0, 26.5))
            Line((0, 26.5), (-12, 26.5))
            ThreePointArc((-12, 26.5), (-12.00193035, 26.499999379), (-12.0038607, 26.499997516))
            ThreePointArc((-12.0038607, 26.499997516), (-13.598505772, 26.038656987), (-14.703701167, 24.8))
            Line((-14.703701167, 24.8), (-14.142428529, 24.8))
            ThreePointArc((-14.142428529, 24.8), (-13.161895004, 25.465863337), (-12, 25.7))
            Line((-12, 25.7), (12, 25.7))
            ThreePointArc((12, 25.7), (13.161895004, 25.465863337), (14.142428529, 24.8))
            Line((14.142428529, 24.8), (14.703701167, 24.8))
            ThreePointArc((14.703701167, 24.8), (13.596871942, 26.03968502), (12, 26.5))
            Line((12, 26.5), (11.133212655, 26.5))
        make_face()
        with BuildLine():
            ThreePointArc((-12, 25.7), (-13.161895004, 25.465863337), (-14.142428529, 24.8))
            Line((-14.142428529, 24.8), (-4.8, 24.8))
            Line((-4.8, 24.8), (4.8, 24.8))
            Line((4.8, 24.8), (14.142428529, 24.8))
            ThreePointArc((14.142428529, 24.8), (13.161895004, 25.465863337), (12, 25.7))
            Line((12, 25.7), (-12, 25.7))
        make_face()
    extrude(amount=CUT_EXTRUDE27_DEPTH, mode=Mode.SUBTRACT)


solid = part.part
